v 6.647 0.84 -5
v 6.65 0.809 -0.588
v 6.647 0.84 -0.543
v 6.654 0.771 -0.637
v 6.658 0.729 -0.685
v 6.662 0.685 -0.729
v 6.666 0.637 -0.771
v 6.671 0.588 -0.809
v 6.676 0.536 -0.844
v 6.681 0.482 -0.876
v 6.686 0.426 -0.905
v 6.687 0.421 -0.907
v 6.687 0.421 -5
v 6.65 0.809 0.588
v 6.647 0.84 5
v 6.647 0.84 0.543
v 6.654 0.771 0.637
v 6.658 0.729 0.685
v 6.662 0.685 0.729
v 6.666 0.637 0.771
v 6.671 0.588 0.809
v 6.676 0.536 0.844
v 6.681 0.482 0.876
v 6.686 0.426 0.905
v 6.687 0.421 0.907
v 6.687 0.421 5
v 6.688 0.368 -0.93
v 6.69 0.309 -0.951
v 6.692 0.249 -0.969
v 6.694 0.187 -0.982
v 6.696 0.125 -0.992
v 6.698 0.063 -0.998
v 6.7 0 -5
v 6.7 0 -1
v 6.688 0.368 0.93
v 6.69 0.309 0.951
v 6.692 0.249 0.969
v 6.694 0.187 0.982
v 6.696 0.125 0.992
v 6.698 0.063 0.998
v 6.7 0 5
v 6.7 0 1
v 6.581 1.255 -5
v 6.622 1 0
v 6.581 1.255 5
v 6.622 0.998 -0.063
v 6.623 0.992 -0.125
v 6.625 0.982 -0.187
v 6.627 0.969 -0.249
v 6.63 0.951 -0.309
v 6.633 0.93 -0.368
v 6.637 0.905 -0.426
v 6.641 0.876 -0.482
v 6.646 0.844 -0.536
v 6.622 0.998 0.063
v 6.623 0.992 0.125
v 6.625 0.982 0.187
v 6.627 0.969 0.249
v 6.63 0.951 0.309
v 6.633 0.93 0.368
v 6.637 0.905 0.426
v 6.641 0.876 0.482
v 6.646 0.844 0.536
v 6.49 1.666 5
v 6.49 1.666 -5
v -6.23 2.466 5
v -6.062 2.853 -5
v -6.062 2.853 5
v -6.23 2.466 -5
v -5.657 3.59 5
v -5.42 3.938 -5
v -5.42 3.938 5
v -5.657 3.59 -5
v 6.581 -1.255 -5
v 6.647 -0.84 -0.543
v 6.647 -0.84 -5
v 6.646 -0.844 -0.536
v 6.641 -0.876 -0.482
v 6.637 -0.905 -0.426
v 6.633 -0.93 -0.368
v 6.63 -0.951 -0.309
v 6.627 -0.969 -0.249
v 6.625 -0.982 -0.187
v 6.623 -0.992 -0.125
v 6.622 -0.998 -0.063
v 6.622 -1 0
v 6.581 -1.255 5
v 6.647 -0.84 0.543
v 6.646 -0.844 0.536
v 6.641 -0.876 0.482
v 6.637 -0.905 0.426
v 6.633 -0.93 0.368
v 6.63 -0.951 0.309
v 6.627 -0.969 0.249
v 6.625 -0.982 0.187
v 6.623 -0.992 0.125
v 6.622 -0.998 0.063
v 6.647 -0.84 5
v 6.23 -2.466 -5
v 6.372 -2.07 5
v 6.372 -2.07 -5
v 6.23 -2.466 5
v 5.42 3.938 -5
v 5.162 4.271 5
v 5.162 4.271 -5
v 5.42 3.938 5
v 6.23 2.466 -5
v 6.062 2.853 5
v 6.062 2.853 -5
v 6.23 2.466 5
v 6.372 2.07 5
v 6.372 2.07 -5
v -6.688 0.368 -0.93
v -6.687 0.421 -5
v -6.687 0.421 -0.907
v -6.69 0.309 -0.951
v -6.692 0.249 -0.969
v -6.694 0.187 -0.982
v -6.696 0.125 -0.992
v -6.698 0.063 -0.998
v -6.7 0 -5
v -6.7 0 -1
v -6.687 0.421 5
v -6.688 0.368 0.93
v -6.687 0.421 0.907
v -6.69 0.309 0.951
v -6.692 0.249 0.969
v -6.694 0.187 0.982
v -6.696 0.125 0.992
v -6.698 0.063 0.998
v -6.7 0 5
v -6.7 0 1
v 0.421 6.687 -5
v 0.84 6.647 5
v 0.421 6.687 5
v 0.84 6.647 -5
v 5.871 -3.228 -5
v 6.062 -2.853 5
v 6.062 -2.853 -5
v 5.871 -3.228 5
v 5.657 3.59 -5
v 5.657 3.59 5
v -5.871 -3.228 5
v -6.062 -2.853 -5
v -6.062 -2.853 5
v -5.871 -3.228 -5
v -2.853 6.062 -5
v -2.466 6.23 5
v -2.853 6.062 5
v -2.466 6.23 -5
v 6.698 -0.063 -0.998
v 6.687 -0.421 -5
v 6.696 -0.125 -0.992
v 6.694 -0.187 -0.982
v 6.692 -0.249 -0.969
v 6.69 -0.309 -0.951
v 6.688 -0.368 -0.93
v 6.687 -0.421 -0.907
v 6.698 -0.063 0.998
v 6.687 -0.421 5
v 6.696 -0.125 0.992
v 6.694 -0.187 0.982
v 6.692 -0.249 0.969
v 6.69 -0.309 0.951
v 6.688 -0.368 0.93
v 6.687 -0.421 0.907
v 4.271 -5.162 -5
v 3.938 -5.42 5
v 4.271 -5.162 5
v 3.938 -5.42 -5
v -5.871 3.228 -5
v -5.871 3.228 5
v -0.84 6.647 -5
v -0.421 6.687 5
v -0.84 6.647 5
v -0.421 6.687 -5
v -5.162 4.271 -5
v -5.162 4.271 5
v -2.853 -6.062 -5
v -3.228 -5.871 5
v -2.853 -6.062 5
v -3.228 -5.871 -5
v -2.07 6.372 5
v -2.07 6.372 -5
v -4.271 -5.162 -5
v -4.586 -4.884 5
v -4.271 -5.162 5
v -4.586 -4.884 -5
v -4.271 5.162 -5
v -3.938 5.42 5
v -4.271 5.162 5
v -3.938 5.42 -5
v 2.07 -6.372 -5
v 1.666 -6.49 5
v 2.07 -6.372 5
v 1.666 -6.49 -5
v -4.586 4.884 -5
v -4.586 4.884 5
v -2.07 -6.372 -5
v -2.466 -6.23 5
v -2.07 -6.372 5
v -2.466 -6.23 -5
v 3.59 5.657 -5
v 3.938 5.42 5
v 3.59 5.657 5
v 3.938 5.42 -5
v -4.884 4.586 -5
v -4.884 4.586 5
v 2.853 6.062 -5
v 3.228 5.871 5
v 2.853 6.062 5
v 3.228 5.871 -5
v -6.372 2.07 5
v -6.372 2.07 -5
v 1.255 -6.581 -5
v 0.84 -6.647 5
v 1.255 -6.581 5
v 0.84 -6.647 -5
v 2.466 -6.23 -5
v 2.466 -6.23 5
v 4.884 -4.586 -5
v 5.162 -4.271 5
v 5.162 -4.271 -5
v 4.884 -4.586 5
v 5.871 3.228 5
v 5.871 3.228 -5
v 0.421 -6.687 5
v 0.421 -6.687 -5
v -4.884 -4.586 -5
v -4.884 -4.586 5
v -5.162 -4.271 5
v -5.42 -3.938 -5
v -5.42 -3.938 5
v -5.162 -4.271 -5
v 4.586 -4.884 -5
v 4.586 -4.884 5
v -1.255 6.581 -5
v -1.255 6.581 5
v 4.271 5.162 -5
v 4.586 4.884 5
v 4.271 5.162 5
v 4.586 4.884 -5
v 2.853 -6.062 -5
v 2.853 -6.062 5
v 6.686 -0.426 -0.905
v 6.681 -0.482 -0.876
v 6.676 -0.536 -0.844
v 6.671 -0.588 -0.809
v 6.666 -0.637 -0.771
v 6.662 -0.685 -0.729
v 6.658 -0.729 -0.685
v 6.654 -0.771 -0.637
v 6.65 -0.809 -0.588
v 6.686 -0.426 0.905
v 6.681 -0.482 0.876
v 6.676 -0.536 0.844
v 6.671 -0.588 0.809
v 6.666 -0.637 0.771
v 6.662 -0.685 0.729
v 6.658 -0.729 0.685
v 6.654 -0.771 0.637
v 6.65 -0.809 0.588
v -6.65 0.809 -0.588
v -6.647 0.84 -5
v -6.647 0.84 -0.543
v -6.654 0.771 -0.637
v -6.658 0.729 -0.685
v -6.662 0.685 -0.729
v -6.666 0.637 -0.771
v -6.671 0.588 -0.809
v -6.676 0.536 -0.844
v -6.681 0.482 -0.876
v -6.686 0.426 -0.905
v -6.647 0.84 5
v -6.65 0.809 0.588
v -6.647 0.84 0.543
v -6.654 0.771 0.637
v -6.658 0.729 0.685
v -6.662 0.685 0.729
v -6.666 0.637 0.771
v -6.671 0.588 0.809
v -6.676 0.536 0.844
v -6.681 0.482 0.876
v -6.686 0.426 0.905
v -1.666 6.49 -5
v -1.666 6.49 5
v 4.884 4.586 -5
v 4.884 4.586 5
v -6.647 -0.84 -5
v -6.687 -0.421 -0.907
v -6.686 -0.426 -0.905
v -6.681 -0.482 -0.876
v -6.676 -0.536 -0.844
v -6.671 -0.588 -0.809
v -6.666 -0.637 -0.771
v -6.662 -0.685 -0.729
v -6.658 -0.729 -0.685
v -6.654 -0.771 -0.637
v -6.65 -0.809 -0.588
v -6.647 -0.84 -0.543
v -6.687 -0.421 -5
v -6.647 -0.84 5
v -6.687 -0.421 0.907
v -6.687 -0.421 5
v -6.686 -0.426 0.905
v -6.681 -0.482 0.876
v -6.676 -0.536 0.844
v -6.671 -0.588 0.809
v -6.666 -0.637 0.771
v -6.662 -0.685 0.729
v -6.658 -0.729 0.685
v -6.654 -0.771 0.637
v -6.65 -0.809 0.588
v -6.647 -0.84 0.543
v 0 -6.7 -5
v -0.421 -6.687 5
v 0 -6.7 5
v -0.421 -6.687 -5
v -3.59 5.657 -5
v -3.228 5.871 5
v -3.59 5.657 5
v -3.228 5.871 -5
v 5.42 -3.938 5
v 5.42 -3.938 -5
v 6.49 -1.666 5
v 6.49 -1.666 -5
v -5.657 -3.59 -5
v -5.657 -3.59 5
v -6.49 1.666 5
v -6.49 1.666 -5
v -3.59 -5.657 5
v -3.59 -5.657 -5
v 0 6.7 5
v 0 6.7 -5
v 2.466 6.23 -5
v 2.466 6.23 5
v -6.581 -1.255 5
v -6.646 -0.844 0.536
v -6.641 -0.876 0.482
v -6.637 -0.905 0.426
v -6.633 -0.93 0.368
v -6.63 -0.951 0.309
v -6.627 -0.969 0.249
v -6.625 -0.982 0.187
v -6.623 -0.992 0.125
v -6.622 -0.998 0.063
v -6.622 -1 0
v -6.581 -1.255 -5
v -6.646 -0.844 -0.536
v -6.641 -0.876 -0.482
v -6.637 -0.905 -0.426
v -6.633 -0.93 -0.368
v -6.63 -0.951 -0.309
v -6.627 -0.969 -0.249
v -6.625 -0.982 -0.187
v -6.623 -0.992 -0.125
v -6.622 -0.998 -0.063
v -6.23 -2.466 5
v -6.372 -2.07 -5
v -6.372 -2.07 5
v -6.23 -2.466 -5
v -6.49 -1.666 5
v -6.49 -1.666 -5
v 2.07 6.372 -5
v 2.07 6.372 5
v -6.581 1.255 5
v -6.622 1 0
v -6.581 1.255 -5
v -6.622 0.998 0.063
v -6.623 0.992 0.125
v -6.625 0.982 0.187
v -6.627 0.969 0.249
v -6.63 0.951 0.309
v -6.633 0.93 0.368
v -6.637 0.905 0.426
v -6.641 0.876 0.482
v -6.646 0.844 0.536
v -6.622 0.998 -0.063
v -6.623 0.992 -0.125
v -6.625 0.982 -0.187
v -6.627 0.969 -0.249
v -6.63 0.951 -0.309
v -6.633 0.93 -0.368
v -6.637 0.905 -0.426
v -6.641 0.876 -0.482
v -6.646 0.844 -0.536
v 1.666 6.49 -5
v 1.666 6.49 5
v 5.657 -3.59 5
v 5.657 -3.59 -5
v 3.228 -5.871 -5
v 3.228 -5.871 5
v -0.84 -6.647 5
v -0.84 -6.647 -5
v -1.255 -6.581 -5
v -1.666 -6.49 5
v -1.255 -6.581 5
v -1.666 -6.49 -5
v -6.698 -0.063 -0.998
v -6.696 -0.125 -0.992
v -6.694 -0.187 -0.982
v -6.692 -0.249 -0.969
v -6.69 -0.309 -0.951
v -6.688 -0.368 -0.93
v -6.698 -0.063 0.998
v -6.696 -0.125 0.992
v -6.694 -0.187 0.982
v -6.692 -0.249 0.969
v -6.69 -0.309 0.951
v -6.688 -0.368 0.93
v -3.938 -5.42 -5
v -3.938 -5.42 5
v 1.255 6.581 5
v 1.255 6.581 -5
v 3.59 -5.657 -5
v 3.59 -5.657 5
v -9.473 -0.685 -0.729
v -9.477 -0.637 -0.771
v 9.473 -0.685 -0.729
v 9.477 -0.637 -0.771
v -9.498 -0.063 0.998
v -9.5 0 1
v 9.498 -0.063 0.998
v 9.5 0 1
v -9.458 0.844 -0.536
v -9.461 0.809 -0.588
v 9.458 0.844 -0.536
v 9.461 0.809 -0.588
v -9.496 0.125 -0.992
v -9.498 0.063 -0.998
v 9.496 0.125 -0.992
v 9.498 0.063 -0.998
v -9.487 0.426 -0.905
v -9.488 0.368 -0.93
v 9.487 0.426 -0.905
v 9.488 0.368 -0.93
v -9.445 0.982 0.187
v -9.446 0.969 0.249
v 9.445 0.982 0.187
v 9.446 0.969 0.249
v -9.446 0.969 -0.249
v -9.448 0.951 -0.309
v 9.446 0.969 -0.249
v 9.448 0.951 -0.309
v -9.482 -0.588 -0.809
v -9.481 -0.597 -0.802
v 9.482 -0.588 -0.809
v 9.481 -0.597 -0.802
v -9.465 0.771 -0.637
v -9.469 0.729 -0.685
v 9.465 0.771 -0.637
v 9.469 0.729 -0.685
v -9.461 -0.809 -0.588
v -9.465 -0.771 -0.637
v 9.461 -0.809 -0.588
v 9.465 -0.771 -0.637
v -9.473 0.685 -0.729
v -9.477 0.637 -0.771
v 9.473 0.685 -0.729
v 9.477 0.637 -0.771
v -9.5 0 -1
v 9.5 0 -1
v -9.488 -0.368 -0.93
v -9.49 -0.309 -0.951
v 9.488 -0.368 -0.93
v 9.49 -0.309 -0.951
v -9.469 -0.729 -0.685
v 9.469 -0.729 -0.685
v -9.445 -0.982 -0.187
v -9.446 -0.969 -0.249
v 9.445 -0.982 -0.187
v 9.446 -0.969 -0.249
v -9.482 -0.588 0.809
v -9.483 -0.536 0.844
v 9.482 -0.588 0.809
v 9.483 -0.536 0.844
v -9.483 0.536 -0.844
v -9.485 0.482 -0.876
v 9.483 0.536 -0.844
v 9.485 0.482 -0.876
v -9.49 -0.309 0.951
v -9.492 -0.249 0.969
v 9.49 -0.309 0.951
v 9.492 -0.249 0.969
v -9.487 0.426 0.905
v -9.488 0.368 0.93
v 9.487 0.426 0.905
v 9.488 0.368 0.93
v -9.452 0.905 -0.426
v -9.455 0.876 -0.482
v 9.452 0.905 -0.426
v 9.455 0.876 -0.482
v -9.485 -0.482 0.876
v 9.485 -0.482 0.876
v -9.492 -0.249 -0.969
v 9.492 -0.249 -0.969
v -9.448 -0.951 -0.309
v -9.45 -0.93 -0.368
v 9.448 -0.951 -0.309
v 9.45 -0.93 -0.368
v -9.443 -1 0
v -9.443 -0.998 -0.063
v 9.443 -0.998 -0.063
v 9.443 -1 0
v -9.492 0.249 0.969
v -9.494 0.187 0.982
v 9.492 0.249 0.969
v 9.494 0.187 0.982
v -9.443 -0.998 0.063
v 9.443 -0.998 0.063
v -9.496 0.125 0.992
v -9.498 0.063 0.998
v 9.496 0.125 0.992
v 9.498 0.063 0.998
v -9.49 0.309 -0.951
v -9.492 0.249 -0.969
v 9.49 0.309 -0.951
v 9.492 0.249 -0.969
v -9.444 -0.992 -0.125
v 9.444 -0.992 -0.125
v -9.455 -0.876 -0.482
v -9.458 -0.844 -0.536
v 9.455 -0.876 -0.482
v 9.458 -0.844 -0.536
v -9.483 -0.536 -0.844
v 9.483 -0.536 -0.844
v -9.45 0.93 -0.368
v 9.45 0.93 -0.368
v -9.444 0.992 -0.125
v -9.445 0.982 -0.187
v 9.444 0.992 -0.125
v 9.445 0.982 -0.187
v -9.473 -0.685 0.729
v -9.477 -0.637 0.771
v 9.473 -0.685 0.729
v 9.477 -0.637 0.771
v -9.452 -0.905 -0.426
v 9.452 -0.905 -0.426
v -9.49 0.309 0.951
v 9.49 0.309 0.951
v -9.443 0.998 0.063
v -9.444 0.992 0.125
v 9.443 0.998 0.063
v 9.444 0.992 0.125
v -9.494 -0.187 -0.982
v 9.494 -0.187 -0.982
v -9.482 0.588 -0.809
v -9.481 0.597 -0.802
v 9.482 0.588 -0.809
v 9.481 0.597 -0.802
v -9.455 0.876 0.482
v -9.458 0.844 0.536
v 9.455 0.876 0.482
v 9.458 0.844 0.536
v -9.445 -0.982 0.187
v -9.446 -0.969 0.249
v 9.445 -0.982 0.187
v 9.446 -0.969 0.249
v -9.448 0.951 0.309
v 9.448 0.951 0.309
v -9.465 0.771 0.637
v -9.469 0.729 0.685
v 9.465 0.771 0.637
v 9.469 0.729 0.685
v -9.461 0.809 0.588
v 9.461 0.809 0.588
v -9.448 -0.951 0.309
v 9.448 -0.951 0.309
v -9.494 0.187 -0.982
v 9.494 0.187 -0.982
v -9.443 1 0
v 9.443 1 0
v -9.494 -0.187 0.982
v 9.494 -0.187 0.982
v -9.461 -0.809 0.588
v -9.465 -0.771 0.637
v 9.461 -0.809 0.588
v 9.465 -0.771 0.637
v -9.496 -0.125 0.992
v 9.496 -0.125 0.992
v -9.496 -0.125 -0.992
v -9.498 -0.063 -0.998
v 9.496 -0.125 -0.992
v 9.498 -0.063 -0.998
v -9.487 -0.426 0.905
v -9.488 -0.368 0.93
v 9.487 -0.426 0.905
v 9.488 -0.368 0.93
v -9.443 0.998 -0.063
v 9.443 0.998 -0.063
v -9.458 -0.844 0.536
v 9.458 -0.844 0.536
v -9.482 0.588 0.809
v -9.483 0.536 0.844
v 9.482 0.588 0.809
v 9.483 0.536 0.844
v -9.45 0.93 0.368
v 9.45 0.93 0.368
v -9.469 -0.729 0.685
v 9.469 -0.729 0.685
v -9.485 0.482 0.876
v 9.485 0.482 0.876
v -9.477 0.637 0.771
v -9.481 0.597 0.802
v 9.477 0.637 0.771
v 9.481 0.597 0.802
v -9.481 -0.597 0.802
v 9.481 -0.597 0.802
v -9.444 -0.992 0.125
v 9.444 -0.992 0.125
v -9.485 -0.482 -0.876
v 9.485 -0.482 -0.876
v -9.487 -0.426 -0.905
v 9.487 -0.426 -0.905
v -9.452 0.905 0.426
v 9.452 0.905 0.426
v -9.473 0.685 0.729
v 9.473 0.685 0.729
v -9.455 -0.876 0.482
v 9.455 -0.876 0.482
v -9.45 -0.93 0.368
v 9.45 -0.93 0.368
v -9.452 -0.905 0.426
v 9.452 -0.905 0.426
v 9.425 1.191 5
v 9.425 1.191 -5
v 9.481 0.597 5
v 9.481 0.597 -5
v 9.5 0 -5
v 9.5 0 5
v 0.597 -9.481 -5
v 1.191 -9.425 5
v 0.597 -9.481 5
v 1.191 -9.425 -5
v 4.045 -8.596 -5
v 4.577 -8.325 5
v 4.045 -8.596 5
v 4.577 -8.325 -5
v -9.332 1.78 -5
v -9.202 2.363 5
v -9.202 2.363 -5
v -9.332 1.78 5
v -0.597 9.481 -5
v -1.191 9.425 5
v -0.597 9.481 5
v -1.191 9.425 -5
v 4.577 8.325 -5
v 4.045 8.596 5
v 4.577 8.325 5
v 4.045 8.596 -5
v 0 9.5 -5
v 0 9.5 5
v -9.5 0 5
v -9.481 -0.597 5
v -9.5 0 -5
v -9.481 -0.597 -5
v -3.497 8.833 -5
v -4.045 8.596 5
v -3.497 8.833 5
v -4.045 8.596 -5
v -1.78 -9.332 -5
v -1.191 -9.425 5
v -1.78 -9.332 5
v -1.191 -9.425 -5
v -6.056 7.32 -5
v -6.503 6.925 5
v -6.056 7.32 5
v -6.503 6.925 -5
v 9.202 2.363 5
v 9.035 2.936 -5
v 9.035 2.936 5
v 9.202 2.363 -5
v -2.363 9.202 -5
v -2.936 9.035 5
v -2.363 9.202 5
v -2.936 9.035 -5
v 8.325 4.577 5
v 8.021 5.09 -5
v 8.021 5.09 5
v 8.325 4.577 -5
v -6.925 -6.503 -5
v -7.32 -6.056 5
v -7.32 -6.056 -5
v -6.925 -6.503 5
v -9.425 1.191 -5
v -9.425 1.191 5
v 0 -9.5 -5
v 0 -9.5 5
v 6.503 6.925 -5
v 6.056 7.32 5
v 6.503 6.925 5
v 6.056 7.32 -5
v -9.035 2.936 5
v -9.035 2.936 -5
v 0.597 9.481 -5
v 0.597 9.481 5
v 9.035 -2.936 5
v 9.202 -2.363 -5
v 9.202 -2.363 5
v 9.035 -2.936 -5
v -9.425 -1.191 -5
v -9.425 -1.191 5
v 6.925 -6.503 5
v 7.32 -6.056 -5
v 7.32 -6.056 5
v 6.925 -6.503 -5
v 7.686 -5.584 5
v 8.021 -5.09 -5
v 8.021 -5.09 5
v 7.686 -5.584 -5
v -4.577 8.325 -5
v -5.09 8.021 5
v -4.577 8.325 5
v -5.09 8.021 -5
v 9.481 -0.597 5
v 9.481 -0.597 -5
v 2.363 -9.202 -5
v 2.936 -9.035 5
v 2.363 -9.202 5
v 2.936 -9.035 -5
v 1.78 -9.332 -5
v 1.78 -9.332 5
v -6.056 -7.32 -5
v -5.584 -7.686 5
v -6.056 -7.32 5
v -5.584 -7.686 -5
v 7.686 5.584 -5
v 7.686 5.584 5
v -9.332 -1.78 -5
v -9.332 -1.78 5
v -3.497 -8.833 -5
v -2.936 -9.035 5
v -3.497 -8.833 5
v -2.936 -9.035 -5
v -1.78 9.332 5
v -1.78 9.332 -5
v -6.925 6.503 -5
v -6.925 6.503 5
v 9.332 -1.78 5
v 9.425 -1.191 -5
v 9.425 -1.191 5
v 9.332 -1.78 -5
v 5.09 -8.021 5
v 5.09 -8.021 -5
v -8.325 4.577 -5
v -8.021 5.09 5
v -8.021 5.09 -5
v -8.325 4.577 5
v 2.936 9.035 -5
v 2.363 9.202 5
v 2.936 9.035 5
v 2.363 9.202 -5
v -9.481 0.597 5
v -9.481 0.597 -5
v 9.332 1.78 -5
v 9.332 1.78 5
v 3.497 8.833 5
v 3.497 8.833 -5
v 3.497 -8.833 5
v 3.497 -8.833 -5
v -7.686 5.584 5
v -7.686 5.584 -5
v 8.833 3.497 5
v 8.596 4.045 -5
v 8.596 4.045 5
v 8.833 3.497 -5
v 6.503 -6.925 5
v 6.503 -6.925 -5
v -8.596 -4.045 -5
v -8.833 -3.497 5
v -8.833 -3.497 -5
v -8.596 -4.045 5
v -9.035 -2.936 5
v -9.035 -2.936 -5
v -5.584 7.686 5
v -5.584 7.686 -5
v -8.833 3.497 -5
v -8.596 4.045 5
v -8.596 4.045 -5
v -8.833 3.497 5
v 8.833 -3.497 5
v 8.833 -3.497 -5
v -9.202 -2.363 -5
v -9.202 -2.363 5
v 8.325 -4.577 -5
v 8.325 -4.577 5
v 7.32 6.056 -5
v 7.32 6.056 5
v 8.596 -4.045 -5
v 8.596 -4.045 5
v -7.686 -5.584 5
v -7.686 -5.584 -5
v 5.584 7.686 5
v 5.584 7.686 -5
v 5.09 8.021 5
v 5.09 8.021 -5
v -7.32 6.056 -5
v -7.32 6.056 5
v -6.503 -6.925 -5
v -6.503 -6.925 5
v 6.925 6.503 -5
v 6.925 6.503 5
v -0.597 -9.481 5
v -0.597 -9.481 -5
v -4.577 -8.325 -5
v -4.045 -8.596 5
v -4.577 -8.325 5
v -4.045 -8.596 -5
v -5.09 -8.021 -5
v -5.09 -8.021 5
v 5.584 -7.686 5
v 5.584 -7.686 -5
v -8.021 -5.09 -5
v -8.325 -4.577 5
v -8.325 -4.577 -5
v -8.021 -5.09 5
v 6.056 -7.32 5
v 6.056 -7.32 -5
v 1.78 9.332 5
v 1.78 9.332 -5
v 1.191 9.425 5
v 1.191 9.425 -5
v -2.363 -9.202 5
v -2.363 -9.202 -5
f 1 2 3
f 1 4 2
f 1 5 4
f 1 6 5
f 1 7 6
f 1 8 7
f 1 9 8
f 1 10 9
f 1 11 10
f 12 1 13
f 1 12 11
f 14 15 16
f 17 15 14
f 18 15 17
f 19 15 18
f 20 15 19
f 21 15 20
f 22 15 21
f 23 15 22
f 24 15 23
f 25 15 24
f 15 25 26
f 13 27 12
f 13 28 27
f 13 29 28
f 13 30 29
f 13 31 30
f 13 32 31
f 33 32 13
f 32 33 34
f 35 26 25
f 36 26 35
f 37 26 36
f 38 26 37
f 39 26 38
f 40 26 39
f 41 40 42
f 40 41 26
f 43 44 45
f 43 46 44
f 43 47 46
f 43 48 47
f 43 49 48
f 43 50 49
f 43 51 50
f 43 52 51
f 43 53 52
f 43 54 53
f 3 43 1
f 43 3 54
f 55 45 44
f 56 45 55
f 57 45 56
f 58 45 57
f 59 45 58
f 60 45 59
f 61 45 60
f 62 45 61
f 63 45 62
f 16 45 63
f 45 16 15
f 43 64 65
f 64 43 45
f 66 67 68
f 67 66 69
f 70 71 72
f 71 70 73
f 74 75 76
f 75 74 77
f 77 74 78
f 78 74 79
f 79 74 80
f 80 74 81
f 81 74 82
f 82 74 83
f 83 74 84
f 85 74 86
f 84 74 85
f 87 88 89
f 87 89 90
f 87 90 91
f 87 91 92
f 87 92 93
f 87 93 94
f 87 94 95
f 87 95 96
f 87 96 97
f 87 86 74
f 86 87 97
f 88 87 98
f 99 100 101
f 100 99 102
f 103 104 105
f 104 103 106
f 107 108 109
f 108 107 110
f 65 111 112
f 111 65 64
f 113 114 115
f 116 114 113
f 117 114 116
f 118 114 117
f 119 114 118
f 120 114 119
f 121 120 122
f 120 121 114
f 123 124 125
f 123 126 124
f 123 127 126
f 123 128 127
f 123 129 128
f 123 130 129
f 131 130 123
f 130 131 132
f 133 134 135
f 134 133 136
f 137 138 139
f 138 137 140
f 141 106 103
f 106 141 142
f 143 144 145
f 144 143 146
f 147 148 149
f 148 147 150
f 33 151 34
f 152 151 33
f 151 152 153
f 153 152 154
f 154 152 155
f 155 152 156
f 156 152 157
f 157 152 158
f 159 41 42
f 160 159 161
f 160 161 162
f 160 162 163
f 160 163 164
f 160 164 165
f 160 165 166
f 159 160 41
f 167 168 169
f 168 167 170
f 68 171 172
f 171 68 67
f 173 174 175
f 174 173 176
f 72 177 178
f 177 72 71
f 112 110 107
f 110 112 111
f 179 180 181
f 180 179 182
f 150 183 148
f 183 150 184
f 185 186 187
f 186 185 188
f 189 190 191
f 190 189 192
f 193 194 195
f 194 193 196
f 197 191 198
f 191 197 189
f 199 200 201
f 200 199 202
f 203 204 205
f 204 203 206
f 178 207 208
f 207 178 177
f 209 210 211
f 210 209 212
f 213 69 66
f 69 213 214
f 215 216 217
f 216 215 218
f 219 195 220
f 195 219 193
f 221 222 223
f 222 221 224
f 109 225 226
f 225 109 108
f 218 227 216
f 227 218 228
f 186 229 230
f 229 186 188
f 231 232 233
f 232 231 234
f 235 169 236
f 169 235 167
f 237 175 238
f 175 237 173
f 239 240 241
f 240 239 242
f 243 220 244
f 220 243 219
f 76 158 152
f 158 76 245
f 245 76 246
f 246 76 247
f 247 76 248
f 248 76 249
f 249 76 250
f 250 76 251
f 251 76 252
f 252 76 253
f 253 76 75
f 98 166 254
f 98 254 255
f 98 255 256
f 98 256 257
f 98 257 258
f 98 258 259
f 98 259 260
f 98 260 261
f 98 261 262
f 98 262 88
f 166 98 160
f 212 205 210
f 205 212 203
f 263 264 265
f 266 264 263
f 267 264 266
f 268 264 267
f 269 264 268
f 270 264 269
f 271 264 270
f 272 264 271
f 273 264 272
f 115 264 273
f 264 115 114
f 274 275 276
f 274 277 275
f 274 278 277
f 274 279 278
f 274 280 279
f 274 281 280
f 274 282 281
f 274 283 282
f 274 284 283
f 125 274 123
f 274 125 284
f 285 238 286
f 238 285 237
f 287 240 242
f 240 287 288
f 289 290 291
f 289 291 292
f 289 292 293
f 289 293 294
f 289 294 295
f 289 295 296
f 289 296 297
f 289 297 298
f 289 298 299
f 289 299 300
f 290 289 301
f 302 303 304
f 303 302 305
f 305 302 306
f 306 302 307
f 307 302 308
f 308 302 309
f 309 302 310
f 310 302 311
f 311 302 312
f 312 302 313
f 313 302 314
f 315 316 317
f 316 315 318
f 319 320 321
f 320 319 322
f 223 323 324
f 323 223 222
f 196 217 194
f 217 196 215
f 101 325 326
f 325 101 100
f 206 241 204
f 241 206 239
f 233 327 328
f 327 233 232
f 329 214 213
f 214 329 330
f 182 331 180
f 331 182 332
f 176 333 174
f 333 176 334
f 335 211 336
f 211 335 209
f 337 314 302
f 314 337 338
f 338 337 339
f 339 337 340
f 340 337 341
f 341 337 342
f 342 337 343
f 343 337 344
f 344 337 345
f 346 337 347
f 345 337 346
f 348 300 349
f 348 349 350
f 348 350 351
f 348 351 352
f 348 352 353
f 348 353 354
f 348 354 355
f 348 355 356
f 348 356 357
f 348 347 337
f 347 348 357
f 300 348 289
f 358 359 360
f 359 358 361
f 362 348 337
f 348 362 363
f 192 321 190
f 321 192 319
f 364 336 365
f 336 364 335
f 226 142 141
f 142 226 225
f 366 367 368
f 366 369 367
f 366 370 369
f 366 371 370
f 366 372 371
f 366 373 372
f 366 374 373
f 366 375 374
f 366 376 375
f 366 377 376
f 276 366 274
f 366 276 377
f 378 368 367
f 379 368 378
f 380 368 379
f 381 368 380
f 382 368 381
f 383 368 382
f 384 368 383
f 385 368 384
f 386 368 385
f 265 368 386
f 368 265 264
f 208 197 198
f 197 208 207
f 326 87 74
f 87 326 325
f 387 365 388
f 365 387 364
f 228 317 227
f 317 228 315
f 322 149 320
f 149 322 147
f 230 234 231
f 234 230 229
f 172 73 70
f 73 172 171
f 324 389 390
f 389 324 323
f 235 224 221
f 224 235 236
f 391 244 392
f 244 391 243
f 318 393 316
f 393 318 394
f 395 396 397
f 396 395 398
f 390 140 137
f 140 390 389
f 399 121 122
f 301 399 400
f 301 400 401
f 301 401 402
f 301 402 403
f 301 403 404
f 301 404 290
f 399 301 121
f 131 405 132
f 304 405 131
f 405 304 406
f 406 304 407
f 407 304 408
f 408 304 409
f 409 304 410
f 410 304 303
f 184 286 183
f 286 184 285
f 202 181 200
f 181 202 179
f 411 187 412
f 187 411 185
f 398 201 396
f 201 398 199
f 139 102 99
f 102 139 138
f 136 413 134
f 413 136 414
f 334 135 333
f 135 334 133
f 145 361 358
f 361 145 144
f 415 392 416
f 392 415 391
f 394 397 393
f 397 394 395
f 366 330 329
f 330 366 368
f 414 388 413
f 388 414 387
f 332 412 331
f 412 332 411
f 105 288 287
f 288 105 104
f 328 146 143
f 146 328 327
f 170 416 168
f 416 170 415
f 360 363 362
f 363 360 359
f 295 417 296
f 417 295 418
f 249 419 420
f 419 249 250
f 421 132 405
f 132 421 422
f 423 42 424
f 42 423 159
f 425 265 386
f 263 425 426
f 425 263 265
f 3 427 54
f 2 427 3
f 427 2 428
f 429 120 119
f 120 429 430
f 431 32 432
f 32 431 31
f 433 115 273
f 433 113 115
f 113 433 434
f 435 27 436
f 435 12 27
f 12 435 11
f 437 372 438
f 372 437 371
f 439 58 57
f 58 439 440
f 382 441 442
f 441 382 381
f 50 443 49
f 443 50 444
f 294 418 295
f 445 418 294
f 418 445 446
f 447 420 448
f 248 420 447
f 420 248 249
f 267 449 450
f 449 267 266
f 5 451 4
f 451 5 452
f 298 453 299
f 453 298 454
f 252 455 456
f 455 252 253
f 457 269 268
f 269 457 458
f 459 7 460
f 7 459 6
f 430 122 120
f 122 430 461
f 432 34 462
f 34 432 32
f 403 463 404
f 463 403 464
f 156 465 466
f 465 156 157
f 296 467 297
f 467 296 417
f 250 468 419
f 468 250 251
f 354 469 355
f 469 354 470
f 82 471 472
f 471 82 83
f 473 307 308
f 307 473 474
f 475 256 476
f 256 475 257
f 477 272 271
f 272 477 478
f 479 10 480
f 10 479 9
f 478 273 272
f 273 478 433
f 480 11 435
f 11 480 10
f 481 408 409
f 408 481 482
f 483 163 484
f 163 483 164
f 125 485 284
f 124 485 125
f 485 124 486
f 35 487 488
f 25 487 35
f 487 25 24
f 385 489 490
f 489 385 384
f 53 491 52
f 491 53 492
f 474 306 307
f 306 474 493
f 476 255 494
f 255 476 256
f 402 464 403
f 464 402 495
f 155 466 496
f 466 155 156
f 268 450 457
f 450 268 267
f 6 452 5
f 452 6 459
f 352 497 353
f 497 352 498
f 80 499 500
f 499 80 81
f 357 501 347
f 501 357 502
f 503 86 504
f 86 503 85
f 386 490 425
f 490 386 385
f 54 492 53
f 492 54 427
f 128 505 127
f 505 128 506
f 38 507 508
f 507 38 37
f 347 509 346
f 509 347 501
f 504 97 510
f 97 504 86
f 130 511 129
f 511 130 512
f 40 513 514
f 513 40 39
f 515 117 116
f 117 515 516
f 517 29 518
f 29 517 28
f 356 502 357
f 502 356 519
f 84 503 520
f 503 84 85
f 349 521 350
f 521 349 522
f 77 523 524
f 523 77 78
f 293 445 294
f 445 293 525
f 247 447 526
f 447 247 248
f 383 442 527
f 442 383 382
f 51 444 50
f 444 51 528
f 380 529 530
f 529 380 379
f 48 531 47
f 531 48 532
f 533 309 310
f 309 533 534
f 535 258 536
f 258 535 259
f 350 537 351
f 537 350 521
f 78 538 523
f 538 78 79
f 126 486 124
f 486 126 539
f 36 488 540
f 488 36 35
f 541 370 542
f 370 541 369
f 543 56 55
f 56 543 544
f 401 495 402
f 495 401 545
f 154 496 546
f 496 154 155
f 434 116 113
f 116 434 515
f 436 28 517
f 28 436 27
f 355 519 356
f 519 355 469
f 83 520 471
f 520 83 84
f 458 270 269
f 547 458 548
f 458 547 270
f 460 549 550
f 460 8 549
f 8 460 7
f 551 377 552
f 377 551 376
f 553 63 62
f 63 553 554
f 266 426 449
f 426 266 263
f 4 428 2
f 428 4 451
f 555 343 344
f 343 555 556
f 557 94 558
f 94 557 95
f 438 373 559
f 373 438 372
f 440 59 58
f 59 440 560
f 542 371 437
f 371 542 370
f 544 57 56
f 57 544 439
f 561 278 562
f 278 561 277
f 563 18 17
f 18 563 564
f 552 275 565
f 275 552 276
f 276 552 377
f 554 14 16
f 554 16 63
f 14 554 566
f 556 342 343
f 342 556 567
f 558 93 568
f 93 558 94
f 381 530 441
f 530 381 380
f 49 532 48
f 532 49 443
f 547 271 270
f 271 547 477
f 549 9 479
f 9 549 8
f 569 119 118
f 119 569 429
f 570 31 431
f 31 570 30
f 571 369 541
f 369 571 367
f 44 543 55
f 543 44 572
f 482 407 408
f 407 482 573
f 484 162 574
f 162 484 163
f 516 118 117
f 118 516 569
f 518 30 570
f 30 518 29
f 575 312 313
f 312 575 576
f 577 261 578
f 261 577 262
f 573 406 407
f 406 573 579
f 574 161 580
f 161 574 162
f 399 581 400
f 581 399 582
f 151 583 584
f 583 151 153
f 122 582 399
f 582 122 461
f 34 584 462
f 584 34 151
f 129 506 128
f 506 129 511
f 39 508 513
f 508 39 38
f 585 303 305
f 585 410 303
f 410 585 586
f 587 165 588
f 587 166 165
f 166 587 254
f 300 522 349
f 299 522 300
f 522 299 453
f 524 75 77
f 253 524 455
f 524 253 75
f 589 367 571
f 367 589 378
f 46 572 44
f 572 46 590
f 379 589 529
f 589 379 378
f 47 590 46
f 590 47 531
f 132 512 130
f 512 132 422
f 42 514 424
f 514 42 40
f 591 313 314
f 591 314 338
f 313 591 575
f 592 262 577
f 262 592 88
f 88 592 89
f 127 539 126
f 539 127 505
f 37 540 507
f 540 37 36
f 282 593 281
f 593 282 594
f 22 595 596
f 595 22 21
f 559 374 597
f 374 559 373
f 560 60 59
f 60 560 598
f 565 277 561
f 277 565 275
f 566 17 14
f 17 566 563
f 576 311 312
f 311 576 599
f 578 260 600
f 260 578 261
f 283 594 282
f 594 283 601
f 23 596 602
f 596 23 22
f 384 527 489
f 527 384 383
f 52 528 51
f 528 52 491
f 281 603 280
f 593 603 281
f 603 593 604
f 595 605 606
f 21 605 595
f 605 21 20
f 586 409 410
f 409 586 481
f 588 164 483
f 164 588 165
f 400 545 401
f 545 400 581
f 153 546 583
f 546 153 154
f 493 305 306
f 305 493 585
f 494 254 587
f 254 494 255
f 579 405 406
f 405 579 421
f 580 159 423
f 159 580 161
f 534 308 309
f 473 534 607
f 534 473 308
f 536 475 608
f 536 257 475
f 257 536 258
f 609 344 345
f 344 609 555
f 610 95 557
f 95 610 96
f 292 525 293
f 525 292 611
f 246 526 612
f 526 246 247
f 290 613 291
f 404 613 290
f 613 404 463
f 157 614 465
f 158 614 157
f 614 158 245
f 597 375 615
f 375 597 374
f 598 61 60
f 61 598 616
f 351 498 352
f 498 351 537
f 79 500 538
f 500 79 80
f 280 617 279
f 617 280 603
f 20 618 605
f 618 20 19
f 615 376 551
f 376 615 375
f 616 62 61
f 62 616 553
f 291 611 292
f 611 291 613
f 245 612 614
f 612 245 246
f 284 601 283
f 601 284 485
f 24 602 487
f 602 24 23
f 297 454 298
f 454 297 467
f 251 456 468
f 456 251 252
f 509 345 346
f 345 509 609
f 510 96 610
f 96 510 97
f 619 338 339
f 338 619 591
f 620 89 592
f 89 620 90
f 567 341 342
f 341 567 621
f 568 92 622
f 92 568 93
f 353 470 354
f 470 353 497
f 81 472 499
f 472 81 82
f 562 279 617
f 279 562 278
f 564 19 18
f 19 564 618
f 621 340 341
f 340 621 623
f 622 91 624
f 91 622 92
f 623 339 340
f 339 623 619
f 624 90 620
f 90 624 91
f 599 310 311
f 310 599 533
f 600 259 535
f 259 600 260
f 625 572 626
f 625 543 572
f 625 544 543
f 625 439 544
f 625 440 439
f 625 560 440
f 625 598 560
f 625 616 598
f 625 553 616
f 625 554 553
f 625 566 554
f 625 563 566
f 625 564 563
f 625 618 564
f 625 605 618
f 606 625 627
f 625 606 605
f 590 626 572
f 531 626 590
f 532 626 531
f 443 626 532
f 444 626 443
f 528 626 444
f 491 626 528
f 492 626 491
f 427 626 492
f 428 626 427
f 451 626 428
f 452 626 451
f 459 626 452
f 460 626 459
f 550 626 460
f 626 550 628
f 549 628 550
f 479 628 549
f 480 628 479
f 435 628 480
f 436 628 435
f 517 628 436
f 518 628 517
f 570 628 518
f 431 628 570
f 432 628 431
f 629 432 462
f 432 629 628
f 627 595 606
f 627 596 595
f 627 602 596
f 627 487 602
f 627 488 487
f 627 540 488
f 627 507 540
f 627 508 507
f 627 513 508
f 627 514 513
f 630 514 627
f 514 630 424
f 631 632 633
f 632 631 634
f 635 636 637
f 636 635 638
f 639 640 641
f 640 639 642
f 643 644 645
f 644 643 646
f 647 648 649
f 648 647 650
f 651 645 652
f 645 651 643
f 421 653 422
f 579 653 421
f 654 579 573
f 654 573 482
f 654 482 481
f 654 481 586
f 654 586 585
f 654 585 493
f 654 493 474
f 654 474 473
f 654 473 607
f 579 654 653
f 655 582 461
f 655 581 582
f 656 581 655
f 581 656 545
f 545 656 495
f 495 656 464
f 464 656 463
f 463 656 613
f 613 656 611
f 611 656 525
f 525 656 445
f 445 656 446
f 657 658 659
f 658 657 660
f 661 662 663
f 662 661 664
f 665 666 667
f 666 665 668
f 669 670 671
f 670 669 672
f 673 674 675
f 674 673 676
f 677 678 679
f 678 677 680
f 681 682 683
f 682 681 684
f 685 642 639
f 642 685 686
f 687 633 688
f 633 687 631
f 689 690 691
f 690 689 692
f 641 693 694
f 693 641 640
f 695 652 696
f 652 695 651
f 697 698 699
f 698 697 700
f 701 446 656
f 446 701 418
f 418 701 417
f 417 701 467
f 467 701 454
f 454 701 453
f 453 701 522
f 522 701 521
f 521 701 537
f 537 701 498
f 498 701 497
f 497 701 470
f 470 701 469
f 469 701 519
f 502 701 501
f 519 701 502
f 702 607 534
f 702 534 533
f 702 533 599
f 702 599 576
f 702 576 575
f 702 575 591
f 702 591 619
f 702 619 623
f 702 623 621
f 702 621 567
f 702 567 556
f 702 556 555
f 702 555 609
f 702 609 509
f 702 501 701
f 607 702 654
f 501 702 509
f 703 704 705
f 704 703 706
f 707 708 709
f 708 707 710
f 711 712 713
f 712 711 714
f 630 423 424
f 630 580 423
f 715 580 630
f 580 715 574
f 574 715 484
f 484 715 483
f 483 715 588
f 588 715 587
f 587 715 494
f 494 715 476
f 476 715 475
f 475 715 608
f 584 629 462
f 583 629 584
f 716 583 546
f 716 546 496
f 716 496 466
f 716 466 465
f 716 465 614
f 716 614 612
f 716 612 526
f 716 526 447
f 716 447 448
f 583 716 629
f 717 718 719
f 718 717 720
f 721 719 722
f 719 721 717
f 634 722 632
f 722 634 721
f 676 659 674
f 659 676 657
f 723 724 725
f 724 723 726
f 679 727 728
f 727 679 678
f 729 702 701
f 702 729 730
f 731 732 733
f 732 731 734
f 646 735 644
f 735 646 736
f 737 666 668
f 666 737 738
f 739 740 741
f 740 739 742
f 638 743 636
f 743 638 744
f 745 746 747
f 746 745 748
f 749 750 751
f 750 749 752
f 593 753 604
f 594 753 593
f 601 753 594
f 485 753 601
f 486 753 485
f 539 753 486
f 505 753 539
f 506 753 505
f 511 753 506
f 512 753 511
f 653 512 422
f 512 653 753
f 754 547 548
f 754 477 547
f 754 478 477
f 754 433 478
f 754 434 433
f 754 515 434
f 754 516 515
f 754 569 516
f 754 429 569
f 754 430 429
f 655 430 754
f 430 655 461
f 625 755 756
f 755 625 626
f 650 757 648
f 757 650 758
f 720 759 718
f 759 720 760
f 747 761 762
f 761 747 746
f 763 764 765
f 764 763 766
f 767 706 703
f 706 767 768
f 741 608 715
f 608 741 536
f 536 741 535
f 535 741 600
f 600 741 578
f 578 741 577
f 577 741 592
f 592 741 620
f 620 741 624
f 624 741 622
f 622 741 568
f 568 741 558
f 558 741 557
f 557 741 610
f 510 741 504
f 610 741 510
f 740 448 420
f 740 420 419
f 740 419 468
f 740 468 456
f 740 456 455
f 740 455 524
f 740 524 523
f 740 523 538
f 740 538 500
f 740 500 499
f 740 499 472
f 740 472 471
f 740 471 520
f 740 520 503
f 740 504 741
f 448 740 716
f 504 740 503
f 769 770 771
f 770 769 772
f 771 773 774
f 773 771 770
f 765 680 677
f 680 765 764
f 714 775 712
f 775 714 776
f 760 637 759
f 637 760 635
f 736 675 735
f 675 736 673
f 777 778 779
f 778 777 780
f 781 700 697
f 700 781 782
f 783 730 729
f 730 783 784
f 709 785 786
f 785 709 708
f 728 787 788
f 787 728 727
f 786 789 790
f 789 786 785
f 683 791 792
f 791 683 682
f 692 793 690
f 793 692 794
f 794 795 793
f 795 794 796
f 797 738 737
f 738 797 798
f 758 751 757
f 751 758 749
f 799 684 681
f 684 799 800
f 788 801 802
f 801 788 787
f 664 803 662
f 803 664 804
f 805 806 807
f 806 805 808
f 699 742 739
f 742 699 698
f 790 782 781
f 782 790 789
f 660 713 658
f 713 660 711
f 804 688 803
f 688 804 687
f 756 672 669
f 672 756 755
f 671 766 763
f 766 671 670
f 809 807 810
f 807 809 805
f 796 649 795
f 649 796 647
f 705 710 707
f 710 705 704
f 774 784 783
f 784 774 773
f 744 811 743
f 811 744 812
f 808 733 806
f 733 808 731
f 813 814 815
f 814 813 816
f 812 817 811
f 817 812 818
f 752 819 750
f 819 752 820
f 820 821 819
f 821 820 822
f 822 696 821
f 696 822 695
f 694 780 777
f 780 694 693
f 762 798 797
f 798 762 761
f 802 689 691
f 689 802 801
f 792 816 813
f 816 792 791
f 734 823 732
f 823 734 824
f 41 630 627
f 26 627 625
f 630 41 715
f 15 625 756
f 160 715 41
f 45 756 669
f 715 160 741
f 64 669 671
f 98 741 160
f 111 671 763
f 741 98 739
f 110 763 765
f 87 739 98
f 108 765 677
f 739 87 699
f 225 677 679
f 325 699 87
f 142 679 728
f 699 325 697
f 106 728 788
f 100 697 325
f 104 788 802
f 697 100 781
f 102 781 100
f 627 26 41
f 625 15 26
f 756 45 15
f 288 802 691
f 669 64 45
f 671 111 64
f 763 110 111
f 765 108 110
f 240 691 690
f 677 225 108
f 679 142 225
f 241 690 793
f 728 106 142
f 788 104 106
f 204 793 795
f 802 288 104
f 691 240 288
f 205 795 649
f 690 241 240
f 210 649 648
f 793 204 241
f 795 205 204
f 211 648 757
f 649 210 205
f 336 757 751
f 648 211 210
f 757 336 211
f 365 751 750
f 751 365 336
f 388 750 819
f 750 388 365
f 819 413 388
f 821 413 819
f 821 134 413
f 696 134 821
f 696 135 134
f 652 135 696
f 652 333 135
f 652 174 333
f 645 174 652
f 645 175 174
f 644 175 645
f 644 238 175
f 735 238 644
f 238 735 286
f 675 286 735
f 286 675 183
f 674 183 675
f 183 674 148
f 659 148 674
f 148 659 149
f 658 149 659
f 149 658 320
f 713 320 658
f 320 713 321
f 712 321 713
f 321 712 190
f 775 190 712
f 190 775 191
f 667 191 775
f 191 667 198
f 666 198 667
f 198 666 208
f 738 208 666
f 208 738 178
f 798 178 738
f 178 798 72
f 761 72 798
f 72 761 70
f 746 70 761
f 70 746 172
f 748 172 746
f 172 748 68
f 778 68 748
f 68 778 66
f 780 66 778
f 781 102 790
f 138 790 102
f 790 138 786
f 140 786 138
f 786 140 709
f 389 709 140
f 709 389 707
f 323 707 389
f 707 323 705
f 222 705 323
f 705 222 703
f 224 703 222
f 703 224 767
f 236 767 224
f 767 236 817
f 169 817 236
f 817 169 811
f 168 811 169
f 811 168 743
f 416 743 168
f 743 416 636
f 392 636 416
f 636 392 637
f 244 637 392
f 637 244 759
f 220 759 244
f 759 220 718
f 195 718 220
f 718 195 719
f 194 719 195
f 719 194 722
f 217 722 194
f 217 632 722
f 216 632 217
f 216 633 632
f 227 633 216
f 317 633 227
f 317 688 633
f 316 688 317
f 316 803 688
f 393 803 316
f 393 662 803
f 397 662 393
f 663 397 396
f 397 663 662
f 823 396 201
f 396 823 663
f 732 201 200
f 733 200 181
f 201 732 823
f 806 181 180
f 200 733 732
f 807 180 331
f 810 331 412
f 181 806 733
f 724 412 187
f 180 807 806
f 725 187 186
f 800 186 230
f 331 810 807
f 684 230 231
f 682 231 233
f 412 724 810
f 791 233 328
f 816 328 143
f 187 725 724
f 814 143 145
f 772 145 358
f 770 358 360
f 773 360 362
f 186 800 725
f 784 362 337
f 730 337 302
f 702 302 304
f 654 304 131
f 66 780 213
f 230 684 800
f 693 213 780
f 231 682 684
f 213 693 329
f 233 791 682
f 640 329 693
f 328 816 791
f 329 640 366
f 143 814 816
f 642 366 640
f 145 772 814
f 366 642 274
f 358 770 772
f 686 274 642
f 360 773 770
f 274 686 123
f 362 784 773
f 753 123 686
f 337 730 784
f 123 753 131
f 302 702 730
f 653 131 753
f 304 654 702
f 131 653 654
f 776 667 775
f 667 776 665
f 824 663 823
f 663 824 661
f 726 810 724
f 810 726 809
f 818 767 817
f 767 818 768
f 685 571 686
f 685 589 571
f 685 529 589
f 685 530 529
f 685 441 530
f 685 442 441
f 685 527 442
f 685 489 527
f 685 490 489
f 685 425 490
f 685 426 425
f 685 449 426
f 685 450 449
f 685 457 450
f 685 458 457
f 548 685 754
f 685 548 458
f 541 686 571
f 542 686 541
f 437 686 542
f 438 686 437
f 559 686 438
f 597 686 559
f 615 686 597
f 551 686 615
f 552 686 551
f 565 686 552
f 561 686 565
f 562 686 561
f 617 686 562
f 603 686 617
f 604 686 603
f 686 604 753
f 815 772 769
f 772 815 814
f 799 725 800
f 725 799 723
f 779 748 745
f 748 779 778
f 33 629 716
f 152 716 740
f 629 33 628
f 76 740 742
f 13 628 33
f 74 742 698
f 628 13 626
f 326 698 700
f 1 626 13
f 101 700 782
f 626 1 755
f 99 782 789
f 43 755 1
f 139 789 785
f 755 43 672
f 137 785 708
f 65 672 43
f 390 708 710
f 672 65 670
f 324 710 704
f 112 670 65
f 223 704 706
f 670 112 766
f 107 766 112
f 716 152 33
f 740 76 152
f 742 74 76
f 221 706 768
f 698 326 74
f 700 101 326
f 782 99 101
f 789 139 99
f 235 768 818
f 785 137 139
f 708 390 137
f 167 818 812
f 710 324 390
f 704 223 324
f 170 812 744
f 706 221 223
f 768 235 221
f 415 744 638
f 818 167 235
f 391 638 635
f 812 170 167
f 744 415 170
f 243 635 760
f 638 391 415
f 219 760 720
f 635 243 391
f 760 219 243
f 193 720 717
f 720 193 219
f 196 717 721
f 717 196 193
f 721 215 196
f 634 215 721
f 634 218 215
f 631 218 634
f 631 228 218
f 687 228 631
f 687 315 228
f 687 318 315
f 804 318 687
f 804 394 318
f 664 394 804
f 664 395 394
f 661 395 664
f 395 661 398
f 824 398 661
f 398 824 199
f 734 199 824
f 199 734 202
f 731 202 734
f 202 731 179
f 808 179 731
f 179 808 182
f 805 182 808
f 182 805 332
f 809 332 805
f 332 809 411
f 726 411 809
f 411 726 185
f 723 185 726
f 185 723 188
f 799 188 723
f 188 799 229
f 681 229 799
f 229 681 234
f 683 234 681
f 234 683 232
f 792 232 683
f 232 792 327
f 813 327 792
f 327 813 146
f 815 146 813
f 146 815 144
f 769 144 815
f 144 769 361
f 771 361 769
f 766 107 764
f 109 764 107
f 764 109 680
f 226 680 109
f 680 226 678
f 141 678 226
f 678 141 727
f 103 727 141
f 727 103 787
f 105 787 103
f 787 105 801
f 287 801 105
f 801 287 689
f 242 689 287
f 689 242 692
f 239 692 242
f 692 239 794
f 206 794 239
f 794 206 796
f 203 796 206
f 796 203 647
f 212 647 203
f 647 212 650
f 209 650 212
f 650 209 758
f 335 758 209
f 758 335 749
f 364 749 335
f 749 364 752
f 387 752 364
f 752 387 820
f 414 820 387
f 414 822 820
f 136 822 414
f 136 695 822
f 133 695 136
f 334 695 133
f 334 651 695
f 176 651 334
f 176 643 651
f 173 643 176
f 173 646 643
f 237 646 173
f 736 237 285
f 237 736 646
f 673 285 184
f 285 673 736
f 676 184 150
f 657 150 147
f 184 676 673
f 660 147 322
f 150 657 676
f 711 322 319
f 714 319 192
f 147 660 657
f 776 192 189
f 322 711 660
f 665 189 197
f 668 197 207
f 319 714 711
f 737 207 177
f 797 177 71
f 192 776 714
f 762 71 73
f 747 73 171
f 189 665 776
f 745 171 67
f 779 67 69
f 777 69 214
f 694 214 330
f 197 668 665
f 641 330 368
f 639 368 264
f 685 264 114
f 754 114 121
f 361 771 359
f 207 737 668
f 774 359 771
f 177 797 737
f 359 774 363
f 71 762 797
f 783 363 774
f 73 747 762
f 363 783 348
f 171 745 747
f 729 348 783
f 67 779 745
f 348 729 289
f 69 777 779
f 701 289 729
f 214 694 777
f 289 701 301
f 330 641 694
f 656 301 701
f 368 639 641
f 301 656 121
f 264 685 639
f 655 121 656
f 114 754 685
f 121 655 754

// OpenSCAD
difference(){
	union(){
        
       translate([0,0,0]){
            rotate(a = [0,0,0]) {
                cylinder(h=10, r=9.5, $fn=100, center=true);
            }
       }		   

	}
	union() {
       translate([0,0,0]){
            rotate(a = [0,0,0]) {
                cylinder(h=600, r=6.7, $fn=100, center=true);
            }
       }			   
        translate([0,0,0]){
            rotate(a = [0,90,0]) {
                cylinder(h=600, r=1.0, $fn=100, center=true);
            }
       }      

        
	}
}
